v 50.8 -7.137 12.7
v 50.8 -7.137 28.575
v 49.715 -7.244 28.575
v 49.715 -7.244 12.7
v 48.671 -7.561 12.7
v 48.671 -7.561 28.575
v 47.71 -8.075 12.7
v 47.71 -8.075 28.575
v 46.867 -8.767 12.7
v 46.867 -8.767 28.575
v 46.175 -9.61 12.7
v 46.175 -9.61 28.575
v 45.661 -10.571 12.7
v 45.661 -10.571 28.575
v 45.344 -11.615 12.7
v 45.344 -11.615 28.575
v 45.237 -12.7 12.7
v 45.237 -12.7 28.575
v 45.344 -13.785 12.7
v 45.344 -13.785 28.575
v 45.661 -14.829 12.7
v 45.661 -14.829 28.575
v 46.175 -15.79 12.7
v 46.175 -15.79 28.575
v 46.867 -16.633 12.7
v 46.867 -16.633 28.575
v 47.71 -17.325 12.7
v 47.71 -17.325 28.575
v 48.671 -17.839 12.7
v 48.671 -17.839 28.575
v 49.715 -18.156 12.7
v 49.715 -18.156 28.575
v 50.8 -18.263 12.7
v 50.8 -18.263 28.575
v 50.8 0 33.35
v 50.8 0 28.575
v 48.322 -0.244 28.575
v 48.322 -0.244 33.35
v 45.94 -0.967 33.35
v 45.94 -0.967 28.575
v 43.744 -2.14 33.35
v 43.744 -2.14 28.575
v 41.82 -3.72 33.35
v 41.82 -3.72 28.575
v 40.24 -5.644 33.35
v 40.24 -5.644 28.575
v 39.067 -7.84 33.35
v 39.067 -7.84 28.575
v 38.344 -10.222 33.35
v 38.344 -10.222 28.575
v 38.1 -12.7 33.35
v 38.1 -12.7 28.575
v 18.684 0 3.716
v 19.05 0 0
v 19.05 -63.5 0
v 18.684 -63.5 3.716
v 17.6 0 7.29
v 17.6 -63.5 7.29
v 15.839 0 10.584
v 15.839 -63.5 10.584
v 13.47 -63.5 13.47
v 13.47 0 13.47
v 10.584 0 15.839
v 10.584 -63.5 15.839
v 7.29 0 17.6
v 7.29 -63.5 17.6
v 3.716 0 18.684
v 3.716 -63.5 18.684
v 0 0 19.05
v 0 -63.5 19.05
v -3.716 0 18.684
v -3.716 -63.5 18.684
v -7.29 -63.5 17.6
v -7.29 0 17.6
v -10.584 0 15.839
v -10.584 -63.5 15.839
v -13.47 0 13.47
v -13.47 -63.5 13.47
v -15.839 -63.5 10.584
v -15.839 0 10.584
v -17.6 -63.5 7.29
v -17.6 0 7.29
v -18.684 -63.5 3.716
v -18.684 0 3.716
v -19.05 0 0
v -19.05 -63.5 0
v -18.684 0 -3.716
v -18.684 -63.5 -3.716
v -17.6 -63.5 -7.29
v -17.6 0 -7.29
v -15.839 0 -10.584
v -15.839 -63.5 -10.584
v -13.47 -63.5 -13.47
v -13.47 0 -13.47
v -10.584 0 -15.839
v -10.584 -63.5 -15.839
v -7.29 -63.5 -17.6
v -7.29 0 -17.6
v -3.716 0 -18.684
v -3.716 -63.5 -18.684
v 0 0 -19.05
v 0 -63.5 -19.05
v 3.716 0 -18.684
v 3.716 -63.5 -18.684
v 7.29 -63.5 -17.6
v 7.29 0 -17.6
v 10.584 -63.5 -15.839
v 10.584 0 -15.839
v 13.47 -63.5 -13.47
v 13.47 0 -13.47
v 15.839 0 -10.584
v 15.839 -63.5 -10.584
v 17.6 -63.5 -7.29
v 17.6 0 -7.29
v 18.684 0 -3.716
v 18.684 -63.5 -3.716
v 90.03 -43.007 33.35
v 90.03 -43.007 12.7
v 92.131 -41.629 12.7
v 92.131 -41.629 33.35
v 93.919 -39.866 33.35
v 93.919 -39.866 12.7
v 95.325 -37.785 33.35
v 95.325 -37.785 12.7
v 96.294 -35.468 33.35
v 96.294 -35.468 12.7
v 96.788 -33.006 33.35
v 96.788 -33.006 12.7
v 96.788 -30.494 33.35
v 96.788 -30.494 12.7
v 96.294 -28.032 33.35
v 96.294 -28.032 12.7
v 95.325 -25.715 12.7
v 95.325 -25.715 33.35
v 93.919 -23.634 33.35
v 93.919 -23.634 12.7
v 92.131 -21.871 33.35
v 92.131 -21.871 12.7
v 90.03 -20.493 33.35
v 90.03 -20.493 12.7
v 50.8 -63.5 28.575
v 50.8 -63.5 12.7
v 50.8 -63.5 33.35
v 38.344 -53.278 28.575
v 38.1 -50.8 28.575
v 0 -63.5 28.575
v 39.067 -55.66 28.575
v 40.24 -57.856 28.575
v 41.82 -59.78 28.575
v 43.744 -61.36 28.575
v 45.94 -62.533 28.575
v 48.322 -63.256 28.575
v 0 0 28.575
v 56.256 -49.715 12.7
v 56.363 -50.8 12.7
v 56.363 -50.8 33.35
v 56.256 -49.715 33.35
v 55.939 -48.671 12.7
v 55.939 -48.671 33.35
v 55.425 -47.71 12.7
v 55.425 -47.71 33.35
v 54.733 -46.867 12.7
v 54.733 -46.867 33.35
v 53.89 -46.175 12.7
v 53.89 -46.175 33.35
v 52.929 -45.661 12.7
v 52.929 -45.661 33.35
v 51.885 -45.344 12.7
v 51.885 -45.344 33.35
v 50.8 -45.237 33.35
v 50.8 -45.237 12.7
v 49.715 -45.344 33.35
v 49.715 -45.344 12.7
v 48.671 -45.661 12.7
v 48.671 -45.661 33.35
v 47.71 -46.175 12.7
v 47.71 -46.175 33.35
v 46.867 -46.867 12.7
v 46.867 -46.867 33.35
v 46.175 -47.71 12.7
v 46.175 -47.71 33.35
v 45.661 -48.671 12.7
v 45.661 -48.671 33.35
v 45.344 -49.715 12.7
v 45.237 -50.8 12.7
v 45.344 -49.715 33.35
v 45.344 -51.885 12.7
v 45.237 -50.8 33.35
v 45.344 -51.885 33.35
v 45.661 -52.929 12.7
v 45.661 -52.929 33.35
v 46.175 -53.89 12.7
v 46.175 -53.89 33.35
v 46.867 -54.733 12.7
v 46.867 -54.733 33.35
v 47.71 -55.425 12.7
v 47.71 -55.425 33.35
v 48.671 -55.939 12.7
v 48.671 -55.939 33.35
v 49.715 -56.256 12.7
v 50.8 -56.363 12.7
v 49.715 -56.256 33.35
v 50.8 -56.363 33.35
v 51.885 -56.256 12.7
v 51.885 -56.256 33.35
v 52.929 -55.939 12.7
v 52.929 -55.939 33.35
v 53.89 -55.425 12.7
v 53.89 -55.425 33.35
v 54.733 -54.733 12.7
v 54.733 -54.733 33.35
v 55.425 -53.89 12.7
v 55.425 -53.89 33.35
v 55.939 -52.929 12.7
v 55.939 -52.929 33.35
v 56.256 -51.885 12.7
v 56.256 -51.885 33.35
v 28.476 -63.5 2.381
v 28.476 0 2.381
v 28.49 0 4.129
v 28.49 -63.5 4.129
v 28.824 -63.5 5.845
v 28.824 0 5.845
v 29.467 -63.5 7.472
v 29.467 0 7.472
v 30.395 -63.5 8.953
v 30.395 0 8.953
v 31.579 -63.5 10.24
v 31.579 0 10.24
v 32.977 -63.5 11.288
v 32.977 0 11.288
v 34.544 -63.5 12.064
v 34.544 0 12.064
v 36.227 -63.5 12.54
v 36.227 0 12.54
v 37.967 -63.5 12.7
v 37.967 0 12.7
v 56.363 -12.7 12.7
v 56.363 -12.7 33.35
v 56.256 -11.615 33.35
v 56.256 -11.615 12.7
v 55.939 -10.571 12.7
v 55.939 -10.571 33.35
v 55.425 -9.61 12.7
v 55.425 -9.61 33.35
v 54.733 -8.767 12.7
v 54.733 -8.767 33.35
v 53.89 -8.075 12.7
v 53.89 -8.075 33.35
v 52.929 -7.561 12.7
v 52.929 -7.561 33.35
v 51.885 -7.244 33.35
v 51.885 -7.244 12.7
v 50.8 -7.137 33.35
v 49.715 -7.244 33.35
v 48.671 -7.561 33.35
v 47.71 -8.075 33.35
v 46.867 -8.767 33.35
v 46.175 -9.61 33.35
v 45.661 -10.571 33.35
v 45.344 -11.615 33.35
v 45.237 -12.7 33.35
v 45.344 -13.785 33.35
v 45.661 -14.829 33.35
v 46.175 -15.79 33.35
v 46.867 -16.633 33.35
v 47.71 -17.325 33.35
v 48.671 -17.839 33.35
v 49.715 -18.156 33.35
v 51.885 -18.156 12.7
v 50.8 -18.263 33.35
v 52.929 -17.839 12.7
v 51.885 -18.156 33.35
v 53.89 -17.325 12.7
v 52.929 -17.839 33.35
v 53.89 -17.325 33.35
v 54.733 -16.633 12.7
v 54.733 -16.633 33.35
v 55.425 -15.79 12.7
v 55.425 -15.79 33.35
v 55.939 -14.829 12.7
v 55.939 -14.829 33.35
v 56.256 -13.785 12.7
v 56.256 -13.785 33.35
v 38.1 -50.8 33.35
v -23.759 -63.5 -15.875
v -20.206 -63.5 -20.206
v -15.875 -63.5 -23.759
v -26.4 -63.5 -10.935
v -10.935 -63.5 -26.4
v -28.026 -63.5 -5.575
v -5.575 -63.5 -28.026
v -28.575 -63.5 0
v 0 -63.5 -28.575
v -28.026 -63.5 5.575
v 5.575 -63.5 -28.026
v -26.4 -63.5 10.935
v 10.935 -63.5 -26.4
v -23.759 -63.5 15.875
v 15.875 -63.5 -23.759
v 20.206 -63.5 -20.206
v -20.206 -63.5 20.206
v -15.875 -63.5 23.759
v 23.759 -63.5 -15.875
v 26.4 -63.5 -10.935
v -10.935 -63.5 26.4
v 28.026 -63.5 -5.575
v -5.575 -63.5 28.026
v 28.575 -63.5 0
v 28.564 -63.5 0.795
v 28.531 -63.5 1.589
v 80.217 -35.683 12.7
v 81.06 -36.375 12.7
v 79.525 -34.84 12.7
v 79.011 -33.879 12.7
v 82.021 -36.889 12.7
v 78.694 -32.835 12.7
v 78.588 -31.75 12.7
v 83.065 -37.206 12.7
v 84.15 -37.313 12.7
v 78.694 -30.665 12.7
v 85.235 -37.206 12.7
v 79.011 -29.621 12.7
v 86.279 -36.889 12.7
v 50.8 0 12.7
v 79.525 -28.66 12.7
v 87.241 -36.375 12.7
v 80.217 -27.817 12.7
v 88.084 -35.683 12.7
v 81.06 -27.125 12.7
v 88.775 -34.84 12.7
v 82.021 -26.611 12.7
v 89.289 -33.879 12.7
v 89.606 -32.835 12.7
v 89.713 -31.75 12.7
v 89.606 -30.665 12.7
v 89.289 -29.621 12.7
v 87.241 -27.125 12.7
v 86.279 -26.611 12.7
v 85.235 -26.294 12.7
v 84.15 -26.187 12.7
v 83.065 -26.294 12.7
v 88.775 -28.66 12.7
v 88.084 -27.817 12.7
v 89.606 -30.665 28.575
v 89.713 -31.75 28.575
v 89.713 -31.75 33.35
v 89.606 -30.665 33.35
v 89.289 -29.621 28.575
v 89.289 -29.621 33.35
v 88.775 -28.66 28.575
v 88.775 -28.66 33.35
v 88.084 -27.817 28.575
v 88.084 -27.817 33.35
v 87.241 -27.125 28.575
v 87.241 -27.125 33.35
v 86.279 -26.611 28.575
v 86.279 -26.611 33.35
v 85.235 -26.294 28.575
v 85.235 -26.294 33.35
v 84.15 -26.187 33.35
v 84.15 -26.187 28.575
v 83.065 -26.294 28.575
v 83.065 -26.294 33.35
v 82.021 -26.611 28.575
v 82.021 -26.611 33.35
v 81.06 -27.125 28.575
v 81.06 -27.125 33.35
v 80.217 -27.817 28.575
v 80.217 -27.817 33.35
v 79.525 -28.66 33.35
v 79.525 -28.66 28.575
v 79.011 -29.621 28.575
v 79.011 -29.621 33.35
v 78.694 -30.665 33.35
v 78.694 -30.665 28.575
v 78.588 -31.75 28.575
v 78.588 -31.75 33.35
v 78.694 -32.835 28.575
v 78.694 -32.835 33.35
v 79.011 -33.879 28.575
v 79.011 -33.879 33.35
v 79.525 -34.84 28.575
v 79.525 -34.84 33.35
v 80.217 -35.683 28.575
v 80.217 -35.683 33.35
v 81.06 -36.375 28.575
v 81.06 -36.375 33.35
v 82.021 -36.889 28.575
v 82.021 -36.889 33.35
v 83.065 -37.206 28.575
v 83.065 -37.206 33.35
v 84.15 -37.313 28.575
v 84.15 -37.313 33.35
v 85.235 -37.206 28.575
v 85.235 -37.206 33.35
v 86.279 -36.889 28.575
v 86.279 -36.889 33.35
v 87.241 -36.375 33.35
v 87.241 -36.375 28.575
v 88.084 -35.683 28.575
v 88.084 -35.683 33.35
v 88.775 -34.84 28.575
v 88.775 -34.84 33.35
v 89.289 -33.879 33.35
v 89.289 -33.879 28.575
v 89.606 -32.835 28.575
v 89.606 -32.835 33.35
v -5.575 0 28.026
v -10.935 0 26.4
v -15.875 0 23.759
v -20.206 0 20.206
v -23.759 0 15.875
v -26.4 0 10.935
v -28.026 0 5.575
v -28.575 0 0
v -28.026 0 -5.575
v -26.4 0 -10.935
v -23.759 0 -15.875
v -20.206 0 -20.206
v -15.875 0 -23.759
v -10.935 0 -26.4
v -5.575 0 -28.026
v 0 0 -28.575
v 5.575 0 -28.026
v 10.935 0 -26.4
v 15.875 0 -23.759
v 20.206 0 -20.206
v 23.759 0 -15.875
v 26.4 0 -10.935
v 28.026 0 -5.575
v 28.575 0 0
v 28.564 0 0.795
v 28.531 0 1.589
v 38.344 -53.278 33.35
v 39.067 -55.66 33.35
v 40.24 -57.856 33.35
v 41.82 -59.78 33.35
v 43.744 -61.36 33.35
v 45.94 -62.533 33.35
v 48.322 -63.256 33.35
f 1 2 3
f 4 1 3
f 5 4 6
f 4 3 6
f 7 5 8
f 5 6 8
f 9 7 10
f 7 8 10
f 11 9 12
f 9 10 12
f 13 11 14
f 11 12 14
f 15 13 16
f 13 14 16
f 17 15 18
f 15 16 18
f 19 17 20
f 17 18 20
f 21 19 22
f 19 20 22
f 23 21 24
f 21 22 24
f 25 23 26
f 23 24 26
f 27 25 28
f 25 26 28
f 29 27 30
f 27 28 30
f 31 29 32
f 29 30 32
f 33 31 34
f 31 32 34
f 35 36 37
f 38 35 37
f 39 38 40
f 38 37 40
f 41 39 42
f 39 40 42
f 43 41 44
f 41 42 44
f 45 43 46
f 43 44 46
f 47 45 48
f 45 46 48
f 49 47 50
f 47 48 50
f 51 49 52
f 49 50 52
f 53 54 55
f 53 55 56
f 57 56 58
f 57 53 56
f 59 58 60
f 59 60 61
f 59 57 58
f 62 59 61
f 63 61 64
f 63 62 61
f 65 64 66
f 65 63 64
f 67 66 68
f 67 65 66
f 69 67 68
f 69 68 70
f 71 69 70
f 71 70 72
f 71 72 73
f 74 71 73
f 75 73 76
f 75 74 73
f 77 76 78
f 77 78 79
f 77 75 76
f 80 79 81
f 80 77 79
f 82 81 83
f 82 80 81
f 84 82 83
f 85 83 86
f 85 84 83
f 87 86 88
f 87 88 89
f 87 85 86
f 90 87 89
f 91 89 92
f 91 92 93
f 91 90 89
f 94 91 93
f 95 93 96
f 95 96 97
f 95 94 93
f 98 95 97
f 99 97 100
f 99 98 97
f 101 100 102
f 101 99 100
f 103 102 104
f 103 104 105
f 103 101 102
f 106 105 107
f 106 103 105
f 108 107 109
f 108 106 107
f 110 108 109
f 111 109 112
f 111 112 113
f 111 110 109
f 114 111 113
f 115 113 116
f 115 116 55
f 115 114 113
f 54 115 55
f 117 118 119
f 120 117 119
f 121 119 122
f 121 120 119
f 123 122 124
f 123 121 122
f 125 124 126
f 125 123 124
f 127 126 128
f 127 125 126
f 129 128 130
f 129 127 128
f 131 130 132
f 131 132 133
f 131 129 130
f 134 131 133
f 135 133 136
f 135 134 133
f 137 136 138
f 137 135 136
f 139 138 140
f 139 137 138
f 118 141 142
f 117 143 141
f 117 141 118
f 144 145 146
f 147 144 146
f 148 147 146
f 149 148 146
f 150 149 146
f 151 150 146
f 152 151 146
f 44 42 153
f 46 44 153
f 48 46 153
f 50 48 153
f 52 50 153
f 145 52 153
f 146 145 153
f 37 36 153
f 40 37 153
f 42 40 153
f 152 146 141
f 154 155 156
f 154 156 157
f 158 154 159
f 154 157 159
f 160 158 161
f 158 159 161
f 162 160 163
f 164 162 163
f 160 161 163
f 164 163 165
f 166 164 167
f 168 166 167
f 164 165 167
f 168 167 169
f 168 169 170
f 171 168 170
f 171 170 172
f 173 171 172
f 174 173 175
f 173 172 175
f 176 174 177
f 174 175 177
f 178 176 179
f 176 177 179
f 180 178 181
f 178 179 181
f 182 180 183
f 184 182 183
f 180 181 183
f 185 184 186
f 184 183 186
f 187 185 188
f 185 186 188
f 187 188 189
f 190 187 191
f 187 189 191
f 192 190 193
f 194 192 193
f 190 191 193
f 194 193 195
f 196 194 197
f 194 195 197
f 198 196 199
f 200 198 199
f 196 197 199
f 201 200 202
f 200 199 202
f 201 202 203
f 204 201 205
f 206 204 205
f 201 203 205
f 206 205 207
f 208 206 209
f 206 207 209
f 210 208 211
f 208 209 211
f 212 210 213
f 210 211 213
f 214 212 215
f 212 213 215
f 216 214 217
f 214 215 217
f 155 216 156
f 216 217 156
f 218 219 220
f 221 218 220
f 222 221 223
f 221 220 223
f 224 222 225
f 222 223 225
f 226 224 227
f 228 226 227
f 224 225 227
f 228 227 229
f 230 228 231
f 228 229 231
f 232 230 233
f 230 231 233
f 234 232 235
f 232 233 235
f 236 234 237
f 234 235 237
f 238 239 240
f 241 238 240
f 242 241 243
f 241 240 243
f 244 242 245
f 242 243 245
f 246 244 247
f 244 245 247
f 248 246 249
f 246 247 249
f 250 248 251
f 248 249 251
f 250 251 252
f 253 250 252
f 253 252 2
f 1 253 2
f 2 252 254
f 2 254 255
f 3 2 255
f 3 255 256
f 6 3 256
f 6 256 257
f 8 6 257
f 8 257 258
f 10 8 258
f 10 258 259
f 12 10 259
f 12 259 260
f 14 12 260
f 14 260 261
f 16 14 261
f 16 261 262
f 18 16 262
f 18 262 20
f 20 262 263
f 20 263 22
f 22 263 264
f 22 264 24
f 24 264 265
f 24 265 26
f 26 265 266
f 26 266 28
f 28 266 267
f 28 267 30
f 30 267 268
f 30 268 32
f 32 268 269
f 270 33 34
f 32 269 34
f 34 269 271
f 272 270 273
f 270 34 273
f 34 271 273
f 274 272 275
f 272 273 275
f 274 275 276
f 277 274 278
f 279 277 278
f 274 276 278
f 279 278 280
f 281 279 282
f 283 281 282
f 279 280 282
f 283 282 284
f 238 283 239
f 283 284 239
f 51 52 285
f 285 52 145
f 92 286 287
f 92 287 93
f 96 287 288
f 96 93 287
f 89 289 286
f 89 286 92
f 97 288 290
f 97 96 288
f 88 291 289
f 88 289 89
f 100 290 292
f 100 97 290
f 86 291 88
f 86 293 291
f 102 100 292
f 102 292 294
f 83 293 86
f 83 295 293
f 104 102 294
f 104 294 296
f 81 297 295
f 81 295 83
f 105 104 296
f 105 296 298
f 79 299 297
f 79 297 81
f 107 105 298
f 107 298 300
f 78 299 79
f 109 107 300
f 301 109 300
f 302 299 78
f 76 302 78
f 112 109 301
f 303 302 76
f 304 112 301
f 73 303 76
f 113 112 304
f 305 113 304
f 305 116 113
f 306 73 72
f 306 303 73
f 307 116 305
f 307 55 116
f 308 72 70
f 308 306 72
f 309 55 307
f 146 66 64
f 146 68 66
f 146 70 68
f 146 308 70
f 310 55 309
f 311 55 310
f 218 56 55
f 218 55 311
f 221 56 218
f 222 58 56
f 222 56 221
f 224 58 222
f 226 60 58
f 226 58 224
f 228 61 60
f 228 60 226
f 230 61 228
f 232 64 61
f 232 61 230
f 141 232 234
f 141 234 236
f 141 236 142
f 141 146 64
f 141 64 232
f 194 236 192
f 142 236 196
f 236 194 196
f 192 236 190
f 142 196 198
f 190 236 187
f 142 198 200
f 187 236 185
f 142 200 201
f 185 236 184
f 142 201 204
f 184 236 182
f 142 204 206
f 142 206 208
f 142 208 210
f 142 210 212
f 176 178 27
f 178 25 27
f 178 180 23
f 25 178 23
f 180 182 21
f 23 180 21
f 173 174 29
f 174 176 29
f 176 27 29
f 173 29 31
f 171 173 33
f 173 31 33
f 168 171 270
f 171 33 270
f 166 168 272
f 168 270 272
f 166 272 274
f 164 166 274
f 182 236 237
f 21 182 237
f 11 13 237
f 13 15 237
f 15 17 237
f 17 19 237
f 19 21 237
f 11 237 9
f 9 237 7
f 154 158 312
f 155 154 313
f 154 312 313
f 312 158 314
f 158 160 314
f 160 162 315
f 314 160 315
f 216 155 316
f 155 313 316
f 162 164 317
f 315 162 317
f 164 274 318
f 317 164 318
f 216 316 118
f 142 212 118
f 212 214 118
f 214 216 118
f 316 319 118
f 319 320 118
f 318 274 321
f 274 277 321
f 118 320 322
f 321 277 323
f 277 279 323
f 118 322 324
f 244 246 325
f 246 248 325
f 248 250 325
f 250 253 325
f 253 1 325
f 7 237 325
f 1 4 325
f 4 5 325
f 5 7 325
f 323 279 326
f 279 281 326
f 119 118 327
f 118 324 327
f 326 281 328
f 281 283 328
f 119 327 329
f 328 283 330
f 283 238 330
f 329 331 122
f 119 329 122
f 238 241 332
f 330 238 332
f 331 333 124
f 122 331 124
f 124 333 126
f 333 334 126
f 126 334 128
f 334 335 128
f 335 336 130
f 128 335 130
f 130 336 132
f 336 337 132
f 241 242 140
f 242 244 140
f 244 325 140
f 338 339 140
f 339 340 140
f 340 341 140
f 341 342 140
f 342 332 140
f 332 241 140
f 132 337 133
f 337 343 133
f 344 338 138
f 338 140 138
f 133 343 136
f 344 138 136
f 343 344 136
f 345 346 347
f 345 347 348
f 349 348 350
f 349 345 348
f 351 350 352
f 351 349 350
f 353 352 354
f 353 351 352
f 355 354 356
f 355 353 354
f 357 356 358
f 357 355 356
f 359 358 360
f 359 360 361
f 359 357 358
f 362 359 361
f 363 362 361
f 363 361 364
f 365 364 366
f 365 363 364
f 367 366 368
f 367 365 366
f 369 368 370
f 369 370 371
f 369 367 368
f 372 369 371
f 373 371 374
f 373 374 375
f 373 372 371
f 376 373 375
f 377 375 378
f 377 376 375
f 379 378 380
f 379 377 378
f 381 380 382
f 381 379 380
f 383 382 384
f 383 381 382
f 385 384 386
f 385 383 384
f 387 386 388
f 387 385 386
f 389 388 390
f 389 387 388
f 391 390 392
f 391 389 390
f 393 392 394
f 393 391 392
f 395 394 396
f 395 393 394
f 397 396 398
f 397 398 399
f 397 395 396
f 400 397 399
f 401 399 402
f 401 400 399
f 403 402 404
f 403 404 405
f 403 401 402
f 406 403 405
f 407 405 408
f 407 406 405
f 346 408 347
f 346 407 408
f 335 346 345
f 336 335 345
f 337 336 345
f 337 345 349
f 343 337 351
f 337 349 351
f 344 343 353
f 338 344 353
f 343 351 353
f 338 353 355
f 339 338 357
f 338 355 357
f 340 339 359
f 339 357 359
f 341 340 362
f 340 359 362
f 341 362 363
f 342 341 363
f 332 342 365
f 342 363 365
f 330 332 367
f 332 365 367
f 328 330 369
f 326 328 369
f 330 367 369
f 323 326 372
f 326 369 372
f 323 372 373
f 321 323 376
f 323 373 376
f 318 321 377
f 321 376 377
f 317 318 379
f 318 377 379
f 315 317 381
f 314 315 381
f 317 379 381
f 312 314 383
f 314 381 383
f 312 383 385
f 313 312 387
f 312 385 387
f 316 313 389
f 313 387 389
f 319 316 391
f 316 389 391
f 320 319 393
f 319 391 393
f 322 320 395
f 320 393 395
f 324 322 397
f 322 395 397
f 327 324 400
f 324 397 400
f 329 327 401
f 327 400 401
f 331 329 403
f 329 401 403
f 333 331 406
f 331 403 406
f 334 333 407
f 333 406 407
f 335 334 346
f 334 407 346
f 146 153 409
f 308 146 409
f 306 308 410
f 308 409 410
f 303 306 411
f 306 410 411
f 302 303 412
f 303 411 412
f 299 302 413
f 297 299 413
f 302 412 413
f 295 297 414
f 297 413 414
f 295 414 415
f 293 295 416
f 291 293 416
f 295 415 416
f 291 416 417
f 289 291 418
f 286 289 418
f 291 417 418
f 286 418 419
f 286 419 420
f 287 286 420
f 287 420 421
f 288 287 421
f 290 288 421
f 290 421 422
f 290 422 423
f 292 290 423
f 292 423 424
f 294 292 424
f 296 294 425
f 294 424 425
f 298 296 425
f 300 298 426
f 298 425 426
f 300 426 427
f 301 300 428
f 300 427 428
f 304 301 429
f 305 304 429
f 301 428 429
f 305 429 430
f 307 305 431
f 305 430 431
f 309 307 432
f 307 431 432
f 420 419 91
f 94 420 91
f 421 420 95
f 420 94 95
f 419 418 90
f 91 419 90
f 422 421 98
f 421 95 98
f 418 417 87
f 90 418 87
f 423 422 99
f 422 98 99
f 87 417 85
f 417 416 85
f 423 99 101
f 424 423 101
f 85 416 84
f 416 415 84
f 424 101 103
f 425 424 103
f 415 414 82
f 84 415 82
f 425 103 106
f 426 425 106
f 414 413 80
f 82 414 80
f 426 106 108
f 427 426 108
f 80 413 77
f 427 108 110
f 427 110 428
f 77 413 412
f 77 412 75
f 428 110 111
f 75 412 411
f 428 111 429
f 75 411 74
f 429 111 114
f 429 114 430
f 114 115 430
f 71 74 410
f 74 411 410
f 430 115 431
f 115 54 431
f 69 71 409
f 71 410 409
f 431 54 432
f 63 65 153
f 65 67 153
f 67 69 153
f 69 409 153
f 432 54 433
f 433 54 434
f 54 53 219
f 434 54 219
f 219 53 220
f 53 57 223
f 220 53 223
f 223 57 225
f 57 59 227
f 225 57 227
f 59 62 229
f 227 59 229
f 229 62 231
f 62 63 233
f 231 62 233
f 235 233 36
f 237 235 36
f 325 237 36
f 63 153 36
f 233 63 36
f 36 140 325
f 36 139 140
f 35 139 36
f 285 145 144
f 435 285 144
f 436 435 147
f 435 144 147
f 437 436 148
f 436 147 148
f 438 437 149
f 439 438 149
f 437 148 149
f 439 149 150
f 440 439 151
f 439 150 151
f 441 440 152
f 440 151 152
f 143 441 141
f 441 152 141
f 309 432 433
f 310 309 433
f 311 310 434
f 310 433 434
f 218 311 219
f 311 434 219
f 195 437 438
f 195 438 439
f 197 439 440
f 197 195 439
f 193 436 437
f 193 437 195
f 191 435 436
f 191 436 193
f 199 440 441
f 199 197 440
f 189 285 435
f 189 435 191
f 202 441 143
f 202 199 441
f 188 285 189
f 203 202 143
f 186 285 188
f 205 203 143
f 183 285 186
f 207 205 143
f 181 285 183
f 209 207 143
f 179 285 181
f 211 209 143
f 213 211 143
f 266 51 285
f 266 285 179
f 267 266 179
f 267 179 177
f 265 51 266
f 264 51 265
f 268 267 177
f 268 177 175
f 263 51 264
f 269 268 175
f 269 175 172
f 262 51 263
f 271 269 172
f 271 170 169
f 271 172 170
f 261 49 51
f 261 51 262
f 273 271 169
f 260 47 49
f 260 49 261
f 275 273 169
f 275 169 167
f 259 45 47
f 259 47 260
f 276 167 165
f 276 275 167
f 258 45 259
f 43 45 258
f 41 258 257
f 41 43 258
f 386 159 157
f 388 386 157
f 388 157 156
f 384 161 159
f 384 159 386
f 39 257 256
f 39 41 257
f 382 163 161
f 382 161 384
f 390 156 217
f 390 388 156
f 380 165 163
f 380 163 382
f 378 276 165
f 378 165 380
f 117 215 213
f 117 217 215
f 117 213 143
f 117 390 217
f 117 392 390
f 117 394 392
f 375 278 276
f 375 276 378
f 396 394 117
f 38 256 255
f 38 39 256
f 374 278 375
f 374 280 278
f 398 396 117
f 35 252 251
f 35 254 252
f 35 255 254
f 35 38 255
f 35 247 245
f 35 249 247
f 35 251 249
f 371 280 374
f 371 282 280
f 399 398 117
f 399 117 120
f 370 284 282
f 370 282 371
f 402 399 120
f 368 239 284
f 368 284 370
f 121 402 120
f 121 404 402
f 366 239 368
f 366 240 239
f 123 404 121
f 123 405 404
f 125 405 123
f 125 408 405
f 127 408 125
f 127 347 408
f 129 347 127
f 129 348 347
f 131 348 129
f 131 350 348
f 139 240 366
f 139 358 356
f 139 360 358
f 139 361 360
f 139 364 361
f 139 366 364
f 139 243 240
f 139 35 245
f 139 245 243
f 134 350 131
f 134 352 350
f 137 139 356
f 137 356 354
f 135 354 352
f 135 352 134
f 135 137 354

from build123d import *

# Parameters (mm, degrees)
F0_R          = 19.05
F1_DEPTH      = 63.5
F2_R          = 5.5626
F3_DEPTH      = 4.7752
F3_DEPTH_BACK = 15.875
F4_DEPTH      = 57.151


with BuildPart() as f1:
    # F0 (on Front) → F1 (new body)
    with BuildSketch(Plane.XZ):
        with BuildLine():
            ThreePointArc((0, 28.575), (19.345366451, 21.0306305629), (28.4756083945, 2.38125))
            ThreePointArc((28.4756083945, 2.38125), (30.9572676717, 9.6234554837), (37.9674778593, 12.7))
            Line((37.9674778593, 12.7), (50.8, 12.7))
            Line((50.8, 12.7), (50.8, 28.575))
            Line((50.8, 28.575), (0, 28.575))
        make_face()
        with BuildLine():
            ThreePointArc((0, 28.575), (-20.2055762724, -20.2055762724), (28.575, 0))
            ThreePointArc((28.575, 0), (28.5501412858, 1.1916616816), (28.4756083945, 2.38125))
            ThreePointArc((28.4756083945, 2.38125), (19.345366451, 21.0306305629), (0, 28.575))
        make_face()
        Circle(F0_R, mode=Mode.SUBTRACT)
    extrude(amount=F1_DEPTH)

    # F2 (on face) → F3 (join, two sides)
    with BuildSketch(Plane.XY.offset(28.575)) as f3_sk:
        with BuildLine():
            Line((90.0304863666, -20.4933472006), (50.8, 0))
            ThreePointArc((50.8, 0), (41.8197438789, -3.7197438789), (38.1, -12.7))
            Line((38.1, -12.7), (38.1, -50.8))
            ThreePointArc((38.1, -50.8), (41.8197438789, -59.7802561211), (50.8, -63.5))
            Line((50.8, -63.5), (90.0304863666, -43.0066527994))
            ThreePointArc((90.0304863666, -43.0066527994), (96.8502, -31.75), (90.0304863666, -20.4933472006))
        make_face()
        with Locations((50.8, -50.8)):
            Circle(F2_R, mode=Mode.SUBTRACT)
        with Locations((50.8, -12.7)):
            Circle(F2_R, mode=Mode.SUBTRACT)
        with Locations((84.1502, -31.75)):
            Circle(F2_R, mode=Mode.SUBTRACT)
    extrude(amount=F3_DEPTH)
    extrude(f3_sk.sketch, amount=-F3_DEPTH_BACK)

    # F2 (on face) → F4 (cut, through all)
    with BuildSketch(Plane.XY.offset(28.575)):
        with BuildLine():
            Line((50.8, -18.2626), (50.8, -7.1374))
            ThreePointArc((50.8, -7.1374), (45.2374, -12.7), (50.8, -18.2626))
        make_face()
        with BuildLine():
            Line((50.8, -56.3626), (50.8, -45.2374))
            ThreePointArc((50.8, -45.2374), (45.2374, -50.8), (50.8, -56.3626))
        make_face()
    extrude(amount=-F4_DEPTH, mode=Mode.SUBTRACT)


solid = f1.part
